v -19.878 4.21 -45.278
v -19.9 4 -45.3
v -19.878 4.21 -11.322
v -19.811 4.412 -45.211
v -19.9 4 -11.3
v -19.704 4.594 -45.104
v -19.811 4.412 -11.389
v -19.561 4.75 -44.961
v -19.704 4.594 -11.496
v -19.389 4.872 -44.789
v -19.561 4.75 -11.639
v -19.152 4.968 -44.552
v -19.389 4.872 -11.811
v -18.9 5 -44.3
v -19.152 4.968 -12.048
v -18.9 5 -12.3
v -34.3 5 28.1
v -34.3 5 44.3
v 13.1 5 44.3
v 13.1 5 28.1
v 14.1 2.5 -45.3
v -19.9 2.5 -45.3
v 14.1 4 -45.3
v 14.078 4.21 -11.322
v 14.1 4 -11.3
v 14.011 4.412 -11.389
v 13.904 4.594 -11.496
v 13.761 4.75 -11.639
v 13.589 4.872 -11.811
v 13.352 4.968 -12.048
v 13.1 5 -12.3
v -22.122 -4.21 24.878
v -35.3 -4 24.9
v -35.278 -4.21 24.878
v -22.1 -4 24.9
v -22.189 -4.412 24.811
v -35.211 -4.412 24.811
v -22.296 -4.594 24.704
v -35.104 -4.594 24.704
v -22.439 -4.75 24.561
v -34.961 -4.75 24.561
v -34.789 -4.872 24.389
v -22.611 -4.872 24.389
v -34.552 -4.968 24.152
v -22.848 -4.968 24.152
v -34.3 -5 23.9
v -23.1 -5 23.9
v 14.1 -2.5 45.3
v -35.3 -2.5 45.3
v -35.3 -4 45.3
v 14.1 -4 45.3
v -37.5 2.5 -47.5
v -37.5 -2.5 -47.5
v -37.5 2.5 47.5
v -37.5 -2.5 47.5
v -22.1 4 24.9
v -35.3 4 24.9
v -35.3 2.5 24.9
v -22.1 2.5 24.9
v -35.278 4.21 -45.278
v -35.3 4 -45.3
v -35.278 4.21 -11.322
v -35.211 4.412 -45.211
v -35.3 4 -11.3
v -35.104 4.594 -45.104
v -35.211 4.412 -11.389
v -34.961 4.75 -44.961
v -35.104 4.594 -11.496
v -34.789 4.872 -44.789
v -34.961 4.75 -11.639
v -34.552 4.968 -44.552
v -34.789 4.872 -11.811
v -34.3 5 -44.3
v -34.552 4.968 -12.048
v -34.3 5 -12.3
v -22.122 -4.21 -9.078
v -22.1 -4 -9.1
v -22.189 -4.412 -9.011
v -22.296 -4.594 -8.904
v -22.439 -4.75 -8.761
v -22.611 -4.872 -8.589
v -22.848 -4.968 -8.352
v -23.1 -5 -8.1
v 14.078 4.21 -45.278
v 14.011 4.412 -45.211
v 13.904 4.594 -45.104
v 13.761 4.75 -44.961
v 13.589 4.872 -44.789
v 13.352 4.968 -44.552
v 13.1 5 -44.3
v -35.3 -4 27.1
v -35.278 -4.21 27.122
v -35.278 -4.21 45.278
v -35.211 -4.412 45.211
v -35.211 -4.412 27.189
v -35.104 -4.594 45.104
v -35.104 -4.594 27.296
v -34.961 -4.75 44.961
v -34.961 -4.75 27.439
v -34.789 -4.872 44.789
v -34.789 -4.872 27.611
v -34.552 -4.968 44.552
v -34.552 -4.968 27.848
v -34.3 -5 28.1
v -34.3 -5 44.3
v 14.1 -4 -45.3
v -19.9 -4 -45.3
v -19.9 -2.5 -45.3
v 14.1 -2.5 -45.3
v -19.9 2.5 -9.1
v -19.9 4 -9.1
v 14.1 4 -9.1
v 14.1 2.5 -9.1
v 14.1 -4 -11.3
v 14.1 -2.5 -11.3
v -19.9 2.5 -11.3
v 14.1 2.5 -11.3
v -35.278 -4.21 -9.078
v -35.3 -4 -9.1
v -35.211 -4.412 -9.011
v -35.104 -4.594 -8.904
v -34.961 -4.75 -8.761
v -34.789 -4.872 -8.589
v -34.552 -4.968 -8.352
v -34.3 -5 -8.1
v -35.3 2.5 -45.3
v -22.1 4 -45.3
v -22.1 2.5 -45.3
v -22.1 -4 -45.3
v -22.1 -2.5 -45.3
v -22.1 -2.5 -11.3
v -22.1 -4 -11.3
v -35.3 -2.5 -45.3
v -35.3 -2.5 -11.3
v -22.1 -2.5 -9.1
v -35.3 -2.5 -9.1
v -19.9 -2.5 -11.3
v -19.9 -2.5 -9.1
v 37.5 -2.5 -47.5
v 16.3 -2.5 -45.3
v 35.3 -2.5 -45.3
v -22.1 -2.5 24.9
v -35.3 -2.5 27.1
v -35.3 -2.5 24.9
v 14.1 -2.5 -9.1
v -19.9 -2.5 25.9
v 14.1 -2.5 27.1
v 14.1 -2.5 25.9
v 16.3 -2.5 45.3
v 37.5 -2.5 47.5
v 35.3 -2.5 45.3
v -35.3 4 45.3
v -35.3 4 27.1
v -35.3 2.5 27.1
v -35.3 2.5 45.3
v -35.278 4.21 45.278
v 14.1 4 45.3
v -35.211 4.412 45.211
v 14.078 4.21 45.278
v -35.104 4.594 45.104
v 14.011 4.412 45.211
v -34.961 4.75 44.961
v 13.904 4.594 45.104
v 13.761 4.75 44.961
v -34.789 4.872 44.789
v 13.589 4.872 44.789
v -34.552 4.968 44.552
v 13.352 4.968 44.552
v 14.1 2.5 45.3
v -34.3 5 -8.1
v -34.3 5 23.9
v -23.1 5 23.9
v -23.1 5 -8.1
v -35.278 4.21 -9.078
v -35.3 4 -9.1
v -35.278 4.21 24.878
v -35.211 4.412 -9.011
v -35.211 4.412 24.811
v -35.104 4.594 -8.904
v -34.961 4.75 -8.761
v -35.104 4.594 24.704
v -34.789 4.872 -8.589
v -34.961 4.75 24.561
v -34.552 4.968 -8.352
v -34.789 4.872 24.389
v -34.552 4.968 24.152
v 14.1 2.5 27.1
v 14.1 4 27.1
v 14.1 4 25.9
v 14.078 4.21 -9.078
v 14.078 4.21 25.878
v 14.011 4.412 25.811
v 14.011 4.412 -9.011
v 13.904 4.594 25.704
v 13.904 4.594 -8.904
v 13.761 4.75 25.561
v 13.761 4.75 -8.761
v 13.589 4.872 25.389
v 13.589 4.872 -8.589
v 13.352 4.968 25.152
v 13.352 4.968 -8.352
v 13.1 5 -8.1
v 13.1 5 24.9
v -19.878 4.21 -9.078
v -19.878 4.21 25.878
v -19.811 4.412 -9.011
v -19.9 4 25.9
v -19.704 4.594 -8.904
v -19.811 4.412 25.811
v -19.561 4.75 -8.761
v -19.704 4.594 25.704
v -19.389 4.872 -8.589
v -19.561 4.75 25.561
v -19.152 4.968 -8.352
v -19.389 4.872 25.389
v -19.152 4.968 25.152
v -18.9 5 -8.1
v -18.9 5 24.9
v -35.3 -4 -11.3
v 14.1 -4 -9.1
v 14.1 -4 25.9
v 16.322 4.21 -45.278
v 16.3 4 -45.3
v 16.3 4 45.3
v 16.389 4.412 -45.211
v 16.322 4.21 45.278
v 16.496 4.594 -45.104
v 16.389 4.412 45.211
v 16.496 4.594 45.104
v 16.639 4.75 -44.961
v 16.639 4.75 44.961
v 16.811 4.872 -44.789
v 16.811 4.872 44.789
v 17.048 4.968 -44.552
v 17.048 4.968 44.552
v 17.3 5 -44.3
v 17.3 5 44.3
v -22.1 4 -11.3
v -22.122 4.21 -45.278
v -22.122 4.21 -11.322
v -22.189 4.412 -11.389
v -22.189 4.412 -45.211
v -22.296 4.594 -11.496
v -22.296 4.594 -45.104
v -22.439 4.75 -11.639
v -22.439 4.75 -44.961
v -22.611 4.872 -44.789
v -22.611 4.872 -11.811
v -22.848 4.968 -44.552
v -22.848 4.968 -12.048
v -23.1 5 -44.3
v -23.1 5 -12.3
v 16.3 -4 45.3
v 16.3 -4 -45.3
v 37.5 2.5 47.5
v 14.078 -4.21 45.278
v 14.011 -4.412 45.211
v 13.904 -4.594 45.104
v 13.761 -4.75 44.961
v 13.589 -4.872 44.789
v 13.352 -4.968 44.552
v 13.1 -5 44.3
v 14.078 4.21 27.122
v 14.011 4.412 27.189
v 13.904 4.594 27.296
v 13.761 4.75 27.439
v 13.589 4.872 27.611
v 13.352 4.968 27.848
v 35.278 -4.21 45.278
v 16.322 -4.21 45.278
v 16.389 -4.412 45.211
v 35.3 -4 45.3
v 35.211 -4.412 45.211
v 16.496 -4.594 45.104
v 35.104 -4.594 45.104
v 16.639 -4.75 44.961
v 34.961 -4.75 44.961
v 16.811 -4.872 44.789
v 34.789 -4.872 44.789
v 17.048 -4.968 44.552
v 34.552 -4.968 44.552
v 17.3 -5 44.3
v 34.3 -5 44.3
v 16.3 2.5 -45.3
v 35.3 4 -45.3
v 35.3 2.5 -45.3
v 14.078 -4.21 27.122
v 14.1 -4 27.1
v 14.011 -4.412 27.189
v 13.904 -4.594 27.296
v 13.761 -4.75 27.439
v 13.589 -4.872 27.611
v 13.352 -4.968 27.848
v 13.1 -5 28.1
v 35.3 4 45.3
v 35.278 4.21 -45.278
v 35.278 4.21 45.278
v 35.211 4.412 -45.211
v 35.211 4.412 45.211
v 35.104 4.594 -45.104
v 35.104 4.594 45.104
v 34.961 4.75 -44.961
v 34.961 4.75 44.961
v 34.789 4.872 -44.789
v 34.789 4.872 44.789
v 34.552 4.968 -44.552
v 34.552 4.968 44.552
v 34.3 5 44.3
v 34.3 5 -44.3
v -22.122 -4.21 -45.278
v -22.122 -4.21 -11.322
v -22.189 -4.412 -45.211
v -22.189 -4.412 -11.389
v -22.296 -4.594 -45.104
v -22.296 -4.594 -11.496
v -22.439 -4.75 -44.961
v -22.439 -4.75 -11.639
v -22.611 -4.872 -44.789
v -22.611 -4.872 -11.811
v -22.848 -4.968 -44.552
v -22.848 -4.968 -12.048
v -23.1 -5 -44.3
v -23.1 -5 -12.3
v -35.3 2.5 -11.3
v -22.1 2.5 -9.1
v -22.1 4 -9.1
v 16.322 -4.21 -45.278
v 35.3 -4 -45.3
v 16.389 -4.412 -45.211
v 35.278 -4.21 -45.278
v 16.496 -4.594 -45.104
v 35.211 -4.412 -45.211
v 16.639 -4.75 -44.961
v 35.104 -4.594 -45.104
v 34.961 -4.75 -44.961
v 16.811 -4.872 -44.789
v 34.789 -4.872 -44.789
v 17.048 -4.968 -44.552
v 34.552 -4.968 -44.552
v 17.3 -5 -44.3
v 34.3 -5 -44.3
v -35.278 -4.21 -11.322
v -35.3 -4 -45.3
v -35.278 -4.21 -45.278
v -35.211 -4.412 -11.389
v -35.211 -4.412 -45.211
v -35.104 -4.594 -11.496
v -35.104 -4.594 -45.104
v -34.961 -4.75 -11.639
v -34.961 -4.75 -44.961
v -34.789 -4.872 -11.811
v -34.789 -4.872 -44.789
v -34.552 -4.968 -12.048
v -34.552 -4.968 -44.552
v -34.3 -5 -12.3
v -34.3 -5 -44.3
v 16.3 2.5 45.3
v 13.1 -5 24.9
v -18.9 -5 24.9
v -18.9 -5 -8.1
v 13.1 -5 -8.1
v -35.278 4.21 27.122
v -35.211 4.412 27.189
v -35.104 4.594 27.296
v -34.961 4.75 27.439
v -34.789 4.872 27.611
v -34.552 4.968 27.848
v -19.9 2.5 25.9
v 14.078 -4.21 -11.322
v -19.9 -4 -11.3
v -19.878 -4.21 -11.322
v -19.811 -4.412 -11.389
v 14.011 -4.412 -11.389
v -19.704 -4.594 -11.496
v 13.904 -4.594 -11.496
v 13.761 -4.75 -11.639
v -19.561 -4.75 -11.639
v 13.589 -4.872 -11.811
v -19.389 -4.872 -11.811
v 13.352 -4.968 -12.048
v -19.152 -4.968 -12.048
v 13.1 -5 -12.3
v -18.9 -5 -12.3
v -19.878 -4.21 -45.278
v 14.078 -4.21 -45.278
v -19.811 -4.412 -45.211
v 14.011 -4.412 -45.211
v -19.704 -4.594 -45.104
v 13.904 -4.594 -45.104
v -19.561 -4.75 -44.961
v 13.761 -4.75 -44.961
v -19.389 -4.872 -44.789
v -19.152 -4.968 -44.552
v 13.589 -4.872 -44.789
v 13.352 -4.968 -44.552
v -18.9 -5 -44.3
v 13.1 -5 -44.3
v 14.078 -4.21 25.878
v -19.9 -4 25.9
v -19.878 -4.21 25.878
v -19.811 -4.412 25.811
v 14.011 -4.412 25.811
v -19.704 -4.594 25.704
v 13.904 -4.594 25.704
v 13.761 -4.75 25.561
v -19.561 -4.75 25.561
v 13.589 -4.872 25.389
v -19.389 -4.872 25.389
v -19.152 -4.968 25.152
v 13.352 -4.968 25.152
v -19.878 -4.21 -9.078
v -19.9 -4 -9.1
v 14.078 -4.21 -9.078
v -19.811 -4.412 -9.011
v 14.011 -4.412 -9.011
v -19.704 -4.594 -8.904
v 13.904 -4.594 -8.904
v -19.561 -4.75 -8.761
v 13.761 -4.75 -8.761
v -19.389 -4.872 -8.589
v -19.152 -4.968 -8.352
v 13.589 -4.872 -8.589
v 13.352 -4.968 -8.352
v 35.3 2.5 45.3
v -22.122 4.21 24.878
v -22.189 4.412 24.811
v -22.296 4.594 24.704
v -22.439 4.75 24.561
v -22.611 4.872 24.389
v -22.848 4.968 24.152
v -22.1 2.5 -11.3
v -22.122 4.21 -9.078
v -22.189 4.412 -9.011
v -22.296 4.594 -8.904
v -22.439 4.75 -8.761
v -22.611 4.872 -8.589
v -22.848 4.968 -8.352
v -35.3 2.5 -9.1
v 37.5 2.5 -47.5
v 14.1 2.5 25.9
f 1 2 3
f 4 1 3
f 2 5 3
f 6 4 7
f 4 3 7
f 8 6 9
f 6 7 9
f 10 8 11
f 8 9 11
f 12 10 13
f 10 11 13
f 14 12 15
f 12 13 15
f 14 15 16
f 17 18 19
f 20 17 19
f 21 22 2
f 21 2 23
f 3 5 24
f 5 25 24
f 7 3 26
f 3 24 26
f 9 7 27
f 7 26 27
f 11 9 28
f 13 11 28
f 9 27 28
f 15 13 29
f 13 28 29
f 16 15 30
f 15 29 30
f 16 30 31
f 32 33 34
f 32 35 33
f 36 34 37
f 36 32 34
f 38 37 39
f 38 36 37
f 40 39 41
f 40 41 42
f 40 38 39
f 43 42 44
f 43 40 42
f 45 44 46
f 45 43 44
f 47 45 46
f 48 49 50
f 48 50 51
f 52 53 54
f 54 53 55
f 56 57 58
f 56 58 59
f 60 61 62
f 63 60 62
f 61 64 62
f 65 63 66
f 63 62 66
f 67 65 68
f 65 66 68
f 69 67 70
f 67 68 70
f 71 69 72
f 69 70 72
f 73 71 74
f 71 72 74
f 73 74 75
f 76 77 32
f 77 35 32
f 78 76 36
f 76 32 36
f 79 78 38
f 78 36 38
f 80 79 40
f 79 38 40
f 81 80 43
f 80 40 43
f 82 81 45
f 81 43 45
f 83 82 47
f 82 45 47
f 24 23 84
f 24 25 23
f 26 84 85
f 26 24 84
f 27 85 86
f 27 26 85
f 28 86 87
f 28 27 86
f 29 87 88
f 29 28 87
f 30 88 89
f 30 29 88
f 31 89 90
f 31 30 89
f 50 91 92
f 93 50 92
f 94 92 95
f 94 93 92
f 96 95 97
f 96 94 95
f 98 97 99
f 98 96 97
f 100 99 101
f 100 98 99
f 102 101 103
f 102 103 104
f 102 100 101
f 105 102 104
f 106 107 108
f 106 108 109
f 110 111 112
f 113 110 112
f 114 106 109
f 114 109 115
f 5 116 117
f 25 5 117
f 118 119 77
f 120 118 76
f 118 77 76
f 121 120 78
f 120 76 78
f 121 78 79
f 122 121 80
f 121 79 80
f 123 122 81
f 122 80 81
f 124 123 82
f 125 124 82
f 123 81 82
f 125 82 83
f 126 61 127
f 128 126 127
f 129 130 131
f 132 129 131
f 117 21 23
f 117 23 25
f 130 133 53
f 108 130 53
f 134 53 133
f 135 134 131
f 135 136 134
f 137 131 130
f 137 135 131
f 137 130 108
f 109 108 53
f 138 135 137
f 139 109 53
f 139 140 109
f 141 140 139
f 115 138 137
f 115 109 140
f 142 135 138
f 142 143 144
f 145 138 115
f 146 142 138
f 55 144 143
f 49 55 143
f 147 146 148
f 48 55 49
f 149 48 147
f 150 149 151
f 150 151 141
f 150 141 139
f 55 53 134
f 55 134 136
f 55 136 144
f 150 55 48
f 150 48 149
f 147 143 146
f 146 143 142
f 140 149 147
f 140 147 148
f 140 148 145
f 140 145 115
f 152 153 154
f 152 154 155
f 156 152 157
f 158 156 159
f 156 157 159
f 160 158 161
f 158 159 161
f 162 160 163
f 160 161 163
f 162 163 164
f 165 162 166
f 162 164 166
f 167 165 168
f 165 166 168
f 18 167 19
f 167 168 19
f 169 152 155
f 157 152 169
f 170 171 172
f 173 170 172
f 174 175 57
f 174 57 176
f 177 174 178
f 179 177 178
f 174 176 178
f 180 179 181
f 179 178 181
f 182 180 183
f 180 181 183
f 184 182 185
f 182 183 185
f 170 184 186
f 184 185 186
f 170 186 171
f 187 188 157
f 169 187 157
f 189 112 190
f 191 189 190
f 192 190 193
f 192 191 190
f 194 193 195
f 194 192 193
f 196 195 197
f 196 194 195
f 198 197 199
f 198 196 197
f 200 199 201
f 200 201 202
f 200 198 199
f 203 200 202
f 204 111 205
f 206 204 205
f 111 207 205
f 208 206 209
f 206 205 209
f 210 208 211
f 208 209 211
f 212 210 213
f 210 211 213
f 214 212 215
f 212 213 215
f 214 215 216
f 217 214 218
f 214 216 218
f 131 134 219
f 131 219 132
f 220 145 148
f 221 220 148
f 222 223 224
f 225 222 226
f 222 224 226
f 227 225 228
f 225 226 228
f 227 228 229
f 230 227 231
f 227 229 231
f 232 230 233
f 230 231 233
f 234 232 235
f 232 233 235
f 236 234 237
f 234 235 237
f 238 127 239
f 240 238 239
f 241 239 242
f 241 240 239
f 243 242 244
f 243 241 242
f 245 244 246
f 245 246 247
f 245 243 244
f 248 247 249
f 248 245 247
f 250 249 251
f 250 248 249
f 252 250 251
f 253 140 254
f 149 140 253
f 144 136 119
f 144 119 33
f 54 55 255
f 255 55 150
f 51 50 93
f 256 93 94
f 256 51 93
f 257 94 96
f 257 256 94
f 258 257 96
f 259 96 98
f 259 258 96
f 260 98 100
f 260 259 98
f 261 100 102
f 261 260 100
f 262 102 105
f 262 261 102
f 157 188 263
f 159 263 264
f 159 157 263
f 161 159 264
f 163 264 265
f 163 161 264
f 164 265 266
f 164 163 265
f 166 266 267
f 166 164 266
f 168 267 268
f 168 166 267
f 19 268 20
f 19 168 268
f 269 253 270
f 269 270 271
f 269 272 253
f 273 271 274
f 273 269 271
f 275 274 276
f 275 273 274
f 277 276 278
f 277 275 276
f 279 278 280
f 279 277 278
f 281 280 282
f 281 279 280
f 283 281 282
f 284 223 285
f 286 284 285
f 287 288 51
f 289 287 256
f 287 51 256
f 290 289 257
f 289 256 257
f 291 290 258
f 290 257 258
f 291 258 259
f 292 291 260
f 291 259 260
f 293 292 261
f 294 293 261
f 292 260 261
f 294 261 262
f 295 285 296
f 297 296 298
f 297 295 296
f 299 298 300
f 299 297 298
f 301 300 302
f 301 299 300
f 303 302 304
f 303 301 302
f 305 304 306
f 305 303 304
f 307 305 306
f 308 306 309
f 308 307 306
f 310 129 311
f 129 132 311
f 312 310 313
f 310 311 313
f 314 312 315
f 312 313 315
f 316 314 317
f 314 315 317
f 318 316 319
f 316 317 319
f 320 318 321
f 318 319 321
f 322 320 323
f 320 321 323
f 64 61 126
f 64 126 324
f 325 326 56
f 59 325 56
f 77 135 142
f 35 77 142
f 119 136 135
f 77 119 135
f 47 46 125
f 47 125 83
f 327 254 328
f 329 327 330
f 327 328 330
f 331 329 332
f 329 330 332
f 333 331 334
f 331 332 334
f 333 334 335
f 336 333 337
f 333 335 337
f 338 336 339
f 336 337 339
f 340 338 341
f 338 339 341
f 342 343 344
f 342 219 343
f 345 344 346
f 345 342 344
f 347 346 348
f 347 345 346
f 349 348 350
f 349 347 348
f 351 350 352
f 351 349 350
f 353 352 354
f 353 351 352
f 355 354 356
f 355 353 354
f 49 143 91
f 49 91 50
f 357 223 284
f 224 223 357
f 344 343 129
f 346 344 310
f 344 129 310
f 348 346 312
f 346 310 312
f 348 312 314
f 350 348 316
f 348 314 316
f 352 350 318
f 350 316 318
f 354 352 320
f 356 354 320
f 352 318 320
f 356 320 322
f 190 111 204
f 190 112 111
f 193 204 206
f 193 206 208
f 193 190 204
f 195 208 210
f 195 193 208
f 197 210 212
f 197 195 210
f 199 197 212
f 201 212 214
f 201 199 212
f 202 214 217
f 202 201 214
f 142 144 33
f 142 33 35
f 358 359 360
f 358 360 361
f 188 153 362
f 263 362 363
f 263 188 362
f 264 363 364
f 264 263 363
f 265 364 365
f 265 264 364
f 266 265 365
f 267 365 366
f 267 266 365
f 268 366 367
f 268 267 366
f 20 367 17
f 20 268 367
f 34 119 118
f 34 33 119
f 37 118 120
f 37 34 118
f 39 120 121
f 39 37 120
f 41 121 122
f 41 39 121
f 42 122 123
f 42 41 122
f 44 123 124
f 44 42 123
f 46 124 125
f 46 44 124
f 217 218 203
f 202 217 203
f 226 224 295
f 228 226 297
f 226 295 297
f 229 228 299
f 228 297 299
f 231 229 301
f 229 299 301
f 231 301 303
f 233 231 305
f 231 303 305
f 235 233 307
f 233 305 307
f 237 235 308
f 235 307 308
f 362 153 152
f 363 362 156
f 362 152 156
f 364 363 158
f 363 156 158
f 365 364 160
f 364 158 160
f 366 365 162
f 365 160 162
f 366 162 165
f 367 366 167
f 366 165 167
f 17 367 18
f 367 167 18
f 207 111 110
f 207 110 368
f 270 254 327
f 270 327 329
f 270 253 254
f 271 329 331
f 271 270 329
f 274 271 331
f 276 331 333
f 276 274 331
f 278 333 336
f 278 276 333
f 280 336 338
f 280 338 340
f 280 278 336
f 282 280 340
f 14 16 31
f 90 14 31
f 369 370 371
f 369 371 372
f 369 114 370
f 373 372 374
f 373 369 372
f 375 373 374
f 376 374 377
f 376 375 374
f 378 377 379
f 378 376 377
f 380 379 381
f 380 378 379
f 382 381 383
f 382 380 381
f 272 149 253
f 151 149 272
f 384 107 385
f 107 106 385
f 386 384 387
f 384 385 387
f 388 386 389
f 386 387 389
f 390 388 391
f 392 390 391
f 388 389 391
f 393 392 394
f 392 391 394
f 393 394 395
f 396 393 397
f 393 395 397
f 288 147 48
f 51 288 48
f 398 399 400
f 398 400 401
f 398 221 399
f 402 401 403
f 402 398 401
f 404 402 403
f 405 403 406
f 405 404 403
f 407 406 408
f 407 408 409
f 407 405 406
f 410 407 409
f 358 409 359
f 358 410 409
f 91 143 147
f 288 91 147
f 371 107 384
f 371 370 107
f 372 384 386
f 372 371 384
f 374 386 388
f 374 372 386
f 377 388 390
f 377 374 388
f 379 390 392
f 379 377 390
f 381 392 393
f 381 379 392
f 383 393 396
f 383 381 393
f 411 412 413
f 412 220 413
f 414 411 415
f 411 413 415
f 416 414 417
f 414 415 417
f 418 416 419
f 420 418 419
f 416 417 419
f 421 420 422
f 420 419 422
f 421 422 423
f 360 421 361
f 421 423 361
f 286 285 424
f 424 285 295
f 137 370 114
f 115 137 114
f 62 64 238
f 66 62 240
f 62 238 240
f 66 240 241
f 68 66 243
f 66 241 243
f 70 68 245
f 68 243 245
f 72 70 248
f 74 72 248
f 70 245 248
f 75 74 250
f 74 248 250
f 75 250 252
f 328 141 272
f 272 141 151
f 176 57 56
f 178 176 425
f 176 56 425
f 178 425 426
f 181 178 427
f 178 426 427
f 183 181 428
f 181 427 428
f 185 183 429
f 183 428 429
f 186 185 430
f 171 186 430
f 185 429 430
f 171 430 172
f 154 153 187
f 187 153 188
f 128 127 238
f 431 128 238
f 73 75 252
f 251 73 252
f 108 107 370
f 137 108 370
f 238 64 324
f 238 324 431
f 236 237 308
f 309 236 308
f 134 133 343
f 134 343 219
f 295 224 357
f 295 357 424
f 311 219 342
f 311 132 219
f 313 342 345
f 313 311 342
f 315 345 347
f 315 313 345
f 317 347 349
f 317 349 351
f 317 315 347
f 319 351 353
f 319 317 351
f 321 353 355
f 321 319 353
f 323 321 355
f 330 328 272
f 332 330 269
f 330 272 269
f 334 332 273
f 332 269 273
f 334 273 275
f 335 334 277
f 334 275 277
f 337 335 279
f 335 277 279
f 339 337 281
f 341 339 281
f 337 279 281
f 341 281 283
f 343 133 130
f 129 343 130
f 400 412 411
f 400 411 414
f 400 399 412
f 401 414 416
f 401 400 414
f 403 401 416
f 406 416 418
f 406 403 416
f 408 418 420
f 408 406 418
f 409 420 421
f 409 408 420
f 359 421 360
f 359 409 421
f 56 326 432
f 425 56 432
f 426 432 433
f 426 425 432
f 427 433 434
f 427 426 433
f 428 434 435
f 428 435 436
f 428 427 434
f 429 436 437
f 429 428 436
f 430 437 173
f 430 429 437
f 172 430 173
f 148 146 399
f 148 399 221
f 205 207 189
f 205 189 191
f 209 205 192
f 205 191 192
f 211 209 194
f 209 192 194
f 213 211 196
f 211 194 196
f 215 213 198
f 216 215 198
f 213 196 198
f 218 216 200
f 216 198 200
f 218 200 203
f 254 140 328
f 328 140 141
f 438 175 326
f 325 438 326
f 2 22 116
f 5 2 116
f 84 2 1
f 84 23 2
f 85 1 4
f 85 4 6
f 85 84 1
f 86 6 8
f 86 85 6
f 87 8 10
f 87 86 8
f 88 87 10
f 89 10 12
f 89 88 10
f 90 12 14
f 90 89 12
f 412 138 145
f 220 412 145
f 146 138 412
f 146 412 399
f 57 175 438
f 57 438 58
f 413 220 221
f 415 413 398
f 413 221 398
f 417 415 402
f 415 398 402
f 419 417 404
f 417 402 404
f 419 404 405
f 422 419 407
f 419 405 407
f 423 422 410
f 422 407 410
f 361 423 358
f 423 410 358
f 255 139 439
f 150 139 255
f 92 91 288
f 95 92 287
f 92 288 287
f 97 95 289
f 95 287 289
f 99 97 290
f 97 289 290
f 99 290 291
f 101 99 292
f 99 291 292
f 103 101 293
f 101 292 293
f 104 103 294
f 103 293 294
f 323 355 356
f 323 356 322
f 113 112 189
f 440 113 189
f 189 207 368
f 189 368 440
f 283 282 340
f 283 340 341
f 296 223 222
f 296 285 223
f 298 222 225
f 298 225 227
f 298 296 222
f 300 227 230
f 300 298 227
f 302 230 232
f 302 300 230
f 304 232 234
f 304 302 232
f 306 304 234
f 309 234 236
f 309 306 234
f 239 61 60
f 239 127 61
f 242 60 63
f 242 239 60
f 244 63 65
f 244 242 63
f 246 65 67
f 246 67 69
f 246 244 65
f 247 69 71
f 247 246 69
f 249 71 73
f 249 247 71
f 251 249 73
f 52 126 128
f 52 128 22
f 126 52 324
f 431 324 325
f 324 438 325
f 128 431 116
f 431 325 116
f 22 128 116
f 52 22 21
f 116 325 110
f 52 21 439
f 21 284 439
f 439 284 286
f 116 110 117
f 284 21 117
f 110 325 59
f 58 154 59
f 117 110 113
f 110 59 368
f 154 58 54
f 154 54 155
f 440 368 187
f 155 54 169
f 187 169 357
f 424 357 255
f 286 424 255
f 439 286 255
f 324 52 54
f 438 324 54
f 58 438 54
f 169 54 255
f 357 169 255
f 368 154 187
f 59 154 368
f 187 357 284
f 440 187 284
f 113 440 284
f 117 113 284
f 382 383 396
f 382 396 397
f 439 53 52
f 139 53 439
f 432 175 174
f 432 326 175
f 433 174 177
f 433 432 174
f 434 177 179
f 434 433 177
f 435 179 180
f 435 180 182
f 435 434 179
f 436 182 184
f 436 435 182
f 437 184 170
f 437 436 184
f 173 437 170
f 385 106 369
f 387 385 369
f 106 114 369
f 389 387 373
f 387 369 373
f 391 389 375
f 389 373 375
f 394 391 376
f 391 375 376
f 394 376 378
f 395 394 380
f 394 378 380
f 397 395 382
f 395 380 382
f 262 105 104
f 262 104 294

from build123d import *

# Parameters (mm, degrees)
SKETCH014_W   = 75
SKETCH014_H   = 95
PAD009_DEPTH  = 2.5
SKETCH013_W   = 49.4
SKETCH013_H   = 18.2
SKETCH013_W_2 = 19
SKETCH013_H_2 = 90.6
SKETCH013_W_3 = 13.2
SKETCH013_H_3 = 34
SKETCH013_W_4 = 34
SKETCH013_H_4 = 35
PAD010_DEPTH  = 5
FILLET006_R   = 1
FILLET007_R   = 1


with BuildPart() as part:
    # Sketch014 → Pad009 (new body, symmetric)
    with BuildSketch(Plane.XZ):
        Rectangle(SKETCH014_W, SKETCH014_H)
    extrude(amount=PAD009_DEPTH, both=True)

    # Sketch013 → Pad010 (join, symmetric)
    with BuildSketch(Plane.XZ):
        with Locations((-10.6, 36.2)):
            Rectangle(SKETCH013_W, SKETCH013_H)
        with Locations((25.8, 0)):
            Rectangle(SKETCH013_W_2, SKETCH013_H_2)
        with Locations((-28.7, 7.9)):
            Rectangle(SKETCH013_W_3, SKETCH013_H_3)
        with Locations((-28.7, -28.3)):
            Rectangle(SKETCH013_W_3, SKETCH013_H_3)
        with Locations((-2.9, 8.4)):
            Rectangle(SKETCH013_W_4, SKETCH013_H_4)
        with Locations((-2.9, -28.3)):
            Rectangle(SKETCH013_W_4, SKETCH013_H_3)
    extrude(amount=PAD010_DEPTH, both=True)

    # Fillet006
    fillet006_edges = [part.edges().sort_by_distance(p)[0] for p in [
        (-10.6, -5, 45.3),
        (14.1, -5, 36.2),
        (-10.6, -5, 27.1),
        (-35.3, -5, 36.2),
        (-28.7, -5, 24.9),
        (-22.1, -5, 7.9),
        (-28.7, -5, -9.1),
        (-35.3, -5, 7.9),
        (-2.9, -5, 25.9),
        (14.1, -5, 8.4),
        (-2.9, -5, -9.1),
        (-19.9, -5, 8.4),
        (-28.7, -5, -11.3),
        (-22.1, -5, -28.3),
        (-28.7, -5, -45.3),
        (-35.3, -5, -28.3),
        (-2.9, -5, -11.3),
        (14.1, -5, -28.3),
        (-2.9, -5, -45.3),
        (-19.9, -5, -28.3),
        (25.8, -5, 45.3),
        (35.3, -5, 0),
        (25.8, -5, -45.3),
        (16.3, -5, 0),
    ]]
    fillet(fillet006_edges, radius=FILLET006_R)

    # Fillet007
    fillet007_edges = [part.edges().sort_by_distance(p)[0] for p in [
        (-10.6, 5, 45.3),
        (14.1, 5, 36.2),
        (-10.6, 5, 27.1),
        (-35.3, 5, 36.2),
        (-28.7, 5, 24.9),
        (-22.1, 5, 7.9),
        (-28.7, 5, -9.1),
        (-35.3, 5, 7.9),
        (-2.9, 5, 25.9),
        (14.1, 5, 8.4),
        (-2.9, 5, -9.1),
        (-19.9, 5, 8.4),
        (-28.7, 5, -11.3),
        (-22.1, 5, -28.3),
        (-28.7, 5, -45.3),
        (-35.3, 5, -28.3),
        (-2.9, 5, -11.3),
        (14.1, 5, -28.3),
        (-2.9, 5, -45.3),
        (-19.9, 5, -28.3),
        (25.8, 5, 45.3),
        (35.3, 5, 0),
        (25.8, 5, -45.3),
        (16.3, 5, 0),
    ]]
    fillet(fillet007_edges, radius=FILLET007_R)


solid = part.part
